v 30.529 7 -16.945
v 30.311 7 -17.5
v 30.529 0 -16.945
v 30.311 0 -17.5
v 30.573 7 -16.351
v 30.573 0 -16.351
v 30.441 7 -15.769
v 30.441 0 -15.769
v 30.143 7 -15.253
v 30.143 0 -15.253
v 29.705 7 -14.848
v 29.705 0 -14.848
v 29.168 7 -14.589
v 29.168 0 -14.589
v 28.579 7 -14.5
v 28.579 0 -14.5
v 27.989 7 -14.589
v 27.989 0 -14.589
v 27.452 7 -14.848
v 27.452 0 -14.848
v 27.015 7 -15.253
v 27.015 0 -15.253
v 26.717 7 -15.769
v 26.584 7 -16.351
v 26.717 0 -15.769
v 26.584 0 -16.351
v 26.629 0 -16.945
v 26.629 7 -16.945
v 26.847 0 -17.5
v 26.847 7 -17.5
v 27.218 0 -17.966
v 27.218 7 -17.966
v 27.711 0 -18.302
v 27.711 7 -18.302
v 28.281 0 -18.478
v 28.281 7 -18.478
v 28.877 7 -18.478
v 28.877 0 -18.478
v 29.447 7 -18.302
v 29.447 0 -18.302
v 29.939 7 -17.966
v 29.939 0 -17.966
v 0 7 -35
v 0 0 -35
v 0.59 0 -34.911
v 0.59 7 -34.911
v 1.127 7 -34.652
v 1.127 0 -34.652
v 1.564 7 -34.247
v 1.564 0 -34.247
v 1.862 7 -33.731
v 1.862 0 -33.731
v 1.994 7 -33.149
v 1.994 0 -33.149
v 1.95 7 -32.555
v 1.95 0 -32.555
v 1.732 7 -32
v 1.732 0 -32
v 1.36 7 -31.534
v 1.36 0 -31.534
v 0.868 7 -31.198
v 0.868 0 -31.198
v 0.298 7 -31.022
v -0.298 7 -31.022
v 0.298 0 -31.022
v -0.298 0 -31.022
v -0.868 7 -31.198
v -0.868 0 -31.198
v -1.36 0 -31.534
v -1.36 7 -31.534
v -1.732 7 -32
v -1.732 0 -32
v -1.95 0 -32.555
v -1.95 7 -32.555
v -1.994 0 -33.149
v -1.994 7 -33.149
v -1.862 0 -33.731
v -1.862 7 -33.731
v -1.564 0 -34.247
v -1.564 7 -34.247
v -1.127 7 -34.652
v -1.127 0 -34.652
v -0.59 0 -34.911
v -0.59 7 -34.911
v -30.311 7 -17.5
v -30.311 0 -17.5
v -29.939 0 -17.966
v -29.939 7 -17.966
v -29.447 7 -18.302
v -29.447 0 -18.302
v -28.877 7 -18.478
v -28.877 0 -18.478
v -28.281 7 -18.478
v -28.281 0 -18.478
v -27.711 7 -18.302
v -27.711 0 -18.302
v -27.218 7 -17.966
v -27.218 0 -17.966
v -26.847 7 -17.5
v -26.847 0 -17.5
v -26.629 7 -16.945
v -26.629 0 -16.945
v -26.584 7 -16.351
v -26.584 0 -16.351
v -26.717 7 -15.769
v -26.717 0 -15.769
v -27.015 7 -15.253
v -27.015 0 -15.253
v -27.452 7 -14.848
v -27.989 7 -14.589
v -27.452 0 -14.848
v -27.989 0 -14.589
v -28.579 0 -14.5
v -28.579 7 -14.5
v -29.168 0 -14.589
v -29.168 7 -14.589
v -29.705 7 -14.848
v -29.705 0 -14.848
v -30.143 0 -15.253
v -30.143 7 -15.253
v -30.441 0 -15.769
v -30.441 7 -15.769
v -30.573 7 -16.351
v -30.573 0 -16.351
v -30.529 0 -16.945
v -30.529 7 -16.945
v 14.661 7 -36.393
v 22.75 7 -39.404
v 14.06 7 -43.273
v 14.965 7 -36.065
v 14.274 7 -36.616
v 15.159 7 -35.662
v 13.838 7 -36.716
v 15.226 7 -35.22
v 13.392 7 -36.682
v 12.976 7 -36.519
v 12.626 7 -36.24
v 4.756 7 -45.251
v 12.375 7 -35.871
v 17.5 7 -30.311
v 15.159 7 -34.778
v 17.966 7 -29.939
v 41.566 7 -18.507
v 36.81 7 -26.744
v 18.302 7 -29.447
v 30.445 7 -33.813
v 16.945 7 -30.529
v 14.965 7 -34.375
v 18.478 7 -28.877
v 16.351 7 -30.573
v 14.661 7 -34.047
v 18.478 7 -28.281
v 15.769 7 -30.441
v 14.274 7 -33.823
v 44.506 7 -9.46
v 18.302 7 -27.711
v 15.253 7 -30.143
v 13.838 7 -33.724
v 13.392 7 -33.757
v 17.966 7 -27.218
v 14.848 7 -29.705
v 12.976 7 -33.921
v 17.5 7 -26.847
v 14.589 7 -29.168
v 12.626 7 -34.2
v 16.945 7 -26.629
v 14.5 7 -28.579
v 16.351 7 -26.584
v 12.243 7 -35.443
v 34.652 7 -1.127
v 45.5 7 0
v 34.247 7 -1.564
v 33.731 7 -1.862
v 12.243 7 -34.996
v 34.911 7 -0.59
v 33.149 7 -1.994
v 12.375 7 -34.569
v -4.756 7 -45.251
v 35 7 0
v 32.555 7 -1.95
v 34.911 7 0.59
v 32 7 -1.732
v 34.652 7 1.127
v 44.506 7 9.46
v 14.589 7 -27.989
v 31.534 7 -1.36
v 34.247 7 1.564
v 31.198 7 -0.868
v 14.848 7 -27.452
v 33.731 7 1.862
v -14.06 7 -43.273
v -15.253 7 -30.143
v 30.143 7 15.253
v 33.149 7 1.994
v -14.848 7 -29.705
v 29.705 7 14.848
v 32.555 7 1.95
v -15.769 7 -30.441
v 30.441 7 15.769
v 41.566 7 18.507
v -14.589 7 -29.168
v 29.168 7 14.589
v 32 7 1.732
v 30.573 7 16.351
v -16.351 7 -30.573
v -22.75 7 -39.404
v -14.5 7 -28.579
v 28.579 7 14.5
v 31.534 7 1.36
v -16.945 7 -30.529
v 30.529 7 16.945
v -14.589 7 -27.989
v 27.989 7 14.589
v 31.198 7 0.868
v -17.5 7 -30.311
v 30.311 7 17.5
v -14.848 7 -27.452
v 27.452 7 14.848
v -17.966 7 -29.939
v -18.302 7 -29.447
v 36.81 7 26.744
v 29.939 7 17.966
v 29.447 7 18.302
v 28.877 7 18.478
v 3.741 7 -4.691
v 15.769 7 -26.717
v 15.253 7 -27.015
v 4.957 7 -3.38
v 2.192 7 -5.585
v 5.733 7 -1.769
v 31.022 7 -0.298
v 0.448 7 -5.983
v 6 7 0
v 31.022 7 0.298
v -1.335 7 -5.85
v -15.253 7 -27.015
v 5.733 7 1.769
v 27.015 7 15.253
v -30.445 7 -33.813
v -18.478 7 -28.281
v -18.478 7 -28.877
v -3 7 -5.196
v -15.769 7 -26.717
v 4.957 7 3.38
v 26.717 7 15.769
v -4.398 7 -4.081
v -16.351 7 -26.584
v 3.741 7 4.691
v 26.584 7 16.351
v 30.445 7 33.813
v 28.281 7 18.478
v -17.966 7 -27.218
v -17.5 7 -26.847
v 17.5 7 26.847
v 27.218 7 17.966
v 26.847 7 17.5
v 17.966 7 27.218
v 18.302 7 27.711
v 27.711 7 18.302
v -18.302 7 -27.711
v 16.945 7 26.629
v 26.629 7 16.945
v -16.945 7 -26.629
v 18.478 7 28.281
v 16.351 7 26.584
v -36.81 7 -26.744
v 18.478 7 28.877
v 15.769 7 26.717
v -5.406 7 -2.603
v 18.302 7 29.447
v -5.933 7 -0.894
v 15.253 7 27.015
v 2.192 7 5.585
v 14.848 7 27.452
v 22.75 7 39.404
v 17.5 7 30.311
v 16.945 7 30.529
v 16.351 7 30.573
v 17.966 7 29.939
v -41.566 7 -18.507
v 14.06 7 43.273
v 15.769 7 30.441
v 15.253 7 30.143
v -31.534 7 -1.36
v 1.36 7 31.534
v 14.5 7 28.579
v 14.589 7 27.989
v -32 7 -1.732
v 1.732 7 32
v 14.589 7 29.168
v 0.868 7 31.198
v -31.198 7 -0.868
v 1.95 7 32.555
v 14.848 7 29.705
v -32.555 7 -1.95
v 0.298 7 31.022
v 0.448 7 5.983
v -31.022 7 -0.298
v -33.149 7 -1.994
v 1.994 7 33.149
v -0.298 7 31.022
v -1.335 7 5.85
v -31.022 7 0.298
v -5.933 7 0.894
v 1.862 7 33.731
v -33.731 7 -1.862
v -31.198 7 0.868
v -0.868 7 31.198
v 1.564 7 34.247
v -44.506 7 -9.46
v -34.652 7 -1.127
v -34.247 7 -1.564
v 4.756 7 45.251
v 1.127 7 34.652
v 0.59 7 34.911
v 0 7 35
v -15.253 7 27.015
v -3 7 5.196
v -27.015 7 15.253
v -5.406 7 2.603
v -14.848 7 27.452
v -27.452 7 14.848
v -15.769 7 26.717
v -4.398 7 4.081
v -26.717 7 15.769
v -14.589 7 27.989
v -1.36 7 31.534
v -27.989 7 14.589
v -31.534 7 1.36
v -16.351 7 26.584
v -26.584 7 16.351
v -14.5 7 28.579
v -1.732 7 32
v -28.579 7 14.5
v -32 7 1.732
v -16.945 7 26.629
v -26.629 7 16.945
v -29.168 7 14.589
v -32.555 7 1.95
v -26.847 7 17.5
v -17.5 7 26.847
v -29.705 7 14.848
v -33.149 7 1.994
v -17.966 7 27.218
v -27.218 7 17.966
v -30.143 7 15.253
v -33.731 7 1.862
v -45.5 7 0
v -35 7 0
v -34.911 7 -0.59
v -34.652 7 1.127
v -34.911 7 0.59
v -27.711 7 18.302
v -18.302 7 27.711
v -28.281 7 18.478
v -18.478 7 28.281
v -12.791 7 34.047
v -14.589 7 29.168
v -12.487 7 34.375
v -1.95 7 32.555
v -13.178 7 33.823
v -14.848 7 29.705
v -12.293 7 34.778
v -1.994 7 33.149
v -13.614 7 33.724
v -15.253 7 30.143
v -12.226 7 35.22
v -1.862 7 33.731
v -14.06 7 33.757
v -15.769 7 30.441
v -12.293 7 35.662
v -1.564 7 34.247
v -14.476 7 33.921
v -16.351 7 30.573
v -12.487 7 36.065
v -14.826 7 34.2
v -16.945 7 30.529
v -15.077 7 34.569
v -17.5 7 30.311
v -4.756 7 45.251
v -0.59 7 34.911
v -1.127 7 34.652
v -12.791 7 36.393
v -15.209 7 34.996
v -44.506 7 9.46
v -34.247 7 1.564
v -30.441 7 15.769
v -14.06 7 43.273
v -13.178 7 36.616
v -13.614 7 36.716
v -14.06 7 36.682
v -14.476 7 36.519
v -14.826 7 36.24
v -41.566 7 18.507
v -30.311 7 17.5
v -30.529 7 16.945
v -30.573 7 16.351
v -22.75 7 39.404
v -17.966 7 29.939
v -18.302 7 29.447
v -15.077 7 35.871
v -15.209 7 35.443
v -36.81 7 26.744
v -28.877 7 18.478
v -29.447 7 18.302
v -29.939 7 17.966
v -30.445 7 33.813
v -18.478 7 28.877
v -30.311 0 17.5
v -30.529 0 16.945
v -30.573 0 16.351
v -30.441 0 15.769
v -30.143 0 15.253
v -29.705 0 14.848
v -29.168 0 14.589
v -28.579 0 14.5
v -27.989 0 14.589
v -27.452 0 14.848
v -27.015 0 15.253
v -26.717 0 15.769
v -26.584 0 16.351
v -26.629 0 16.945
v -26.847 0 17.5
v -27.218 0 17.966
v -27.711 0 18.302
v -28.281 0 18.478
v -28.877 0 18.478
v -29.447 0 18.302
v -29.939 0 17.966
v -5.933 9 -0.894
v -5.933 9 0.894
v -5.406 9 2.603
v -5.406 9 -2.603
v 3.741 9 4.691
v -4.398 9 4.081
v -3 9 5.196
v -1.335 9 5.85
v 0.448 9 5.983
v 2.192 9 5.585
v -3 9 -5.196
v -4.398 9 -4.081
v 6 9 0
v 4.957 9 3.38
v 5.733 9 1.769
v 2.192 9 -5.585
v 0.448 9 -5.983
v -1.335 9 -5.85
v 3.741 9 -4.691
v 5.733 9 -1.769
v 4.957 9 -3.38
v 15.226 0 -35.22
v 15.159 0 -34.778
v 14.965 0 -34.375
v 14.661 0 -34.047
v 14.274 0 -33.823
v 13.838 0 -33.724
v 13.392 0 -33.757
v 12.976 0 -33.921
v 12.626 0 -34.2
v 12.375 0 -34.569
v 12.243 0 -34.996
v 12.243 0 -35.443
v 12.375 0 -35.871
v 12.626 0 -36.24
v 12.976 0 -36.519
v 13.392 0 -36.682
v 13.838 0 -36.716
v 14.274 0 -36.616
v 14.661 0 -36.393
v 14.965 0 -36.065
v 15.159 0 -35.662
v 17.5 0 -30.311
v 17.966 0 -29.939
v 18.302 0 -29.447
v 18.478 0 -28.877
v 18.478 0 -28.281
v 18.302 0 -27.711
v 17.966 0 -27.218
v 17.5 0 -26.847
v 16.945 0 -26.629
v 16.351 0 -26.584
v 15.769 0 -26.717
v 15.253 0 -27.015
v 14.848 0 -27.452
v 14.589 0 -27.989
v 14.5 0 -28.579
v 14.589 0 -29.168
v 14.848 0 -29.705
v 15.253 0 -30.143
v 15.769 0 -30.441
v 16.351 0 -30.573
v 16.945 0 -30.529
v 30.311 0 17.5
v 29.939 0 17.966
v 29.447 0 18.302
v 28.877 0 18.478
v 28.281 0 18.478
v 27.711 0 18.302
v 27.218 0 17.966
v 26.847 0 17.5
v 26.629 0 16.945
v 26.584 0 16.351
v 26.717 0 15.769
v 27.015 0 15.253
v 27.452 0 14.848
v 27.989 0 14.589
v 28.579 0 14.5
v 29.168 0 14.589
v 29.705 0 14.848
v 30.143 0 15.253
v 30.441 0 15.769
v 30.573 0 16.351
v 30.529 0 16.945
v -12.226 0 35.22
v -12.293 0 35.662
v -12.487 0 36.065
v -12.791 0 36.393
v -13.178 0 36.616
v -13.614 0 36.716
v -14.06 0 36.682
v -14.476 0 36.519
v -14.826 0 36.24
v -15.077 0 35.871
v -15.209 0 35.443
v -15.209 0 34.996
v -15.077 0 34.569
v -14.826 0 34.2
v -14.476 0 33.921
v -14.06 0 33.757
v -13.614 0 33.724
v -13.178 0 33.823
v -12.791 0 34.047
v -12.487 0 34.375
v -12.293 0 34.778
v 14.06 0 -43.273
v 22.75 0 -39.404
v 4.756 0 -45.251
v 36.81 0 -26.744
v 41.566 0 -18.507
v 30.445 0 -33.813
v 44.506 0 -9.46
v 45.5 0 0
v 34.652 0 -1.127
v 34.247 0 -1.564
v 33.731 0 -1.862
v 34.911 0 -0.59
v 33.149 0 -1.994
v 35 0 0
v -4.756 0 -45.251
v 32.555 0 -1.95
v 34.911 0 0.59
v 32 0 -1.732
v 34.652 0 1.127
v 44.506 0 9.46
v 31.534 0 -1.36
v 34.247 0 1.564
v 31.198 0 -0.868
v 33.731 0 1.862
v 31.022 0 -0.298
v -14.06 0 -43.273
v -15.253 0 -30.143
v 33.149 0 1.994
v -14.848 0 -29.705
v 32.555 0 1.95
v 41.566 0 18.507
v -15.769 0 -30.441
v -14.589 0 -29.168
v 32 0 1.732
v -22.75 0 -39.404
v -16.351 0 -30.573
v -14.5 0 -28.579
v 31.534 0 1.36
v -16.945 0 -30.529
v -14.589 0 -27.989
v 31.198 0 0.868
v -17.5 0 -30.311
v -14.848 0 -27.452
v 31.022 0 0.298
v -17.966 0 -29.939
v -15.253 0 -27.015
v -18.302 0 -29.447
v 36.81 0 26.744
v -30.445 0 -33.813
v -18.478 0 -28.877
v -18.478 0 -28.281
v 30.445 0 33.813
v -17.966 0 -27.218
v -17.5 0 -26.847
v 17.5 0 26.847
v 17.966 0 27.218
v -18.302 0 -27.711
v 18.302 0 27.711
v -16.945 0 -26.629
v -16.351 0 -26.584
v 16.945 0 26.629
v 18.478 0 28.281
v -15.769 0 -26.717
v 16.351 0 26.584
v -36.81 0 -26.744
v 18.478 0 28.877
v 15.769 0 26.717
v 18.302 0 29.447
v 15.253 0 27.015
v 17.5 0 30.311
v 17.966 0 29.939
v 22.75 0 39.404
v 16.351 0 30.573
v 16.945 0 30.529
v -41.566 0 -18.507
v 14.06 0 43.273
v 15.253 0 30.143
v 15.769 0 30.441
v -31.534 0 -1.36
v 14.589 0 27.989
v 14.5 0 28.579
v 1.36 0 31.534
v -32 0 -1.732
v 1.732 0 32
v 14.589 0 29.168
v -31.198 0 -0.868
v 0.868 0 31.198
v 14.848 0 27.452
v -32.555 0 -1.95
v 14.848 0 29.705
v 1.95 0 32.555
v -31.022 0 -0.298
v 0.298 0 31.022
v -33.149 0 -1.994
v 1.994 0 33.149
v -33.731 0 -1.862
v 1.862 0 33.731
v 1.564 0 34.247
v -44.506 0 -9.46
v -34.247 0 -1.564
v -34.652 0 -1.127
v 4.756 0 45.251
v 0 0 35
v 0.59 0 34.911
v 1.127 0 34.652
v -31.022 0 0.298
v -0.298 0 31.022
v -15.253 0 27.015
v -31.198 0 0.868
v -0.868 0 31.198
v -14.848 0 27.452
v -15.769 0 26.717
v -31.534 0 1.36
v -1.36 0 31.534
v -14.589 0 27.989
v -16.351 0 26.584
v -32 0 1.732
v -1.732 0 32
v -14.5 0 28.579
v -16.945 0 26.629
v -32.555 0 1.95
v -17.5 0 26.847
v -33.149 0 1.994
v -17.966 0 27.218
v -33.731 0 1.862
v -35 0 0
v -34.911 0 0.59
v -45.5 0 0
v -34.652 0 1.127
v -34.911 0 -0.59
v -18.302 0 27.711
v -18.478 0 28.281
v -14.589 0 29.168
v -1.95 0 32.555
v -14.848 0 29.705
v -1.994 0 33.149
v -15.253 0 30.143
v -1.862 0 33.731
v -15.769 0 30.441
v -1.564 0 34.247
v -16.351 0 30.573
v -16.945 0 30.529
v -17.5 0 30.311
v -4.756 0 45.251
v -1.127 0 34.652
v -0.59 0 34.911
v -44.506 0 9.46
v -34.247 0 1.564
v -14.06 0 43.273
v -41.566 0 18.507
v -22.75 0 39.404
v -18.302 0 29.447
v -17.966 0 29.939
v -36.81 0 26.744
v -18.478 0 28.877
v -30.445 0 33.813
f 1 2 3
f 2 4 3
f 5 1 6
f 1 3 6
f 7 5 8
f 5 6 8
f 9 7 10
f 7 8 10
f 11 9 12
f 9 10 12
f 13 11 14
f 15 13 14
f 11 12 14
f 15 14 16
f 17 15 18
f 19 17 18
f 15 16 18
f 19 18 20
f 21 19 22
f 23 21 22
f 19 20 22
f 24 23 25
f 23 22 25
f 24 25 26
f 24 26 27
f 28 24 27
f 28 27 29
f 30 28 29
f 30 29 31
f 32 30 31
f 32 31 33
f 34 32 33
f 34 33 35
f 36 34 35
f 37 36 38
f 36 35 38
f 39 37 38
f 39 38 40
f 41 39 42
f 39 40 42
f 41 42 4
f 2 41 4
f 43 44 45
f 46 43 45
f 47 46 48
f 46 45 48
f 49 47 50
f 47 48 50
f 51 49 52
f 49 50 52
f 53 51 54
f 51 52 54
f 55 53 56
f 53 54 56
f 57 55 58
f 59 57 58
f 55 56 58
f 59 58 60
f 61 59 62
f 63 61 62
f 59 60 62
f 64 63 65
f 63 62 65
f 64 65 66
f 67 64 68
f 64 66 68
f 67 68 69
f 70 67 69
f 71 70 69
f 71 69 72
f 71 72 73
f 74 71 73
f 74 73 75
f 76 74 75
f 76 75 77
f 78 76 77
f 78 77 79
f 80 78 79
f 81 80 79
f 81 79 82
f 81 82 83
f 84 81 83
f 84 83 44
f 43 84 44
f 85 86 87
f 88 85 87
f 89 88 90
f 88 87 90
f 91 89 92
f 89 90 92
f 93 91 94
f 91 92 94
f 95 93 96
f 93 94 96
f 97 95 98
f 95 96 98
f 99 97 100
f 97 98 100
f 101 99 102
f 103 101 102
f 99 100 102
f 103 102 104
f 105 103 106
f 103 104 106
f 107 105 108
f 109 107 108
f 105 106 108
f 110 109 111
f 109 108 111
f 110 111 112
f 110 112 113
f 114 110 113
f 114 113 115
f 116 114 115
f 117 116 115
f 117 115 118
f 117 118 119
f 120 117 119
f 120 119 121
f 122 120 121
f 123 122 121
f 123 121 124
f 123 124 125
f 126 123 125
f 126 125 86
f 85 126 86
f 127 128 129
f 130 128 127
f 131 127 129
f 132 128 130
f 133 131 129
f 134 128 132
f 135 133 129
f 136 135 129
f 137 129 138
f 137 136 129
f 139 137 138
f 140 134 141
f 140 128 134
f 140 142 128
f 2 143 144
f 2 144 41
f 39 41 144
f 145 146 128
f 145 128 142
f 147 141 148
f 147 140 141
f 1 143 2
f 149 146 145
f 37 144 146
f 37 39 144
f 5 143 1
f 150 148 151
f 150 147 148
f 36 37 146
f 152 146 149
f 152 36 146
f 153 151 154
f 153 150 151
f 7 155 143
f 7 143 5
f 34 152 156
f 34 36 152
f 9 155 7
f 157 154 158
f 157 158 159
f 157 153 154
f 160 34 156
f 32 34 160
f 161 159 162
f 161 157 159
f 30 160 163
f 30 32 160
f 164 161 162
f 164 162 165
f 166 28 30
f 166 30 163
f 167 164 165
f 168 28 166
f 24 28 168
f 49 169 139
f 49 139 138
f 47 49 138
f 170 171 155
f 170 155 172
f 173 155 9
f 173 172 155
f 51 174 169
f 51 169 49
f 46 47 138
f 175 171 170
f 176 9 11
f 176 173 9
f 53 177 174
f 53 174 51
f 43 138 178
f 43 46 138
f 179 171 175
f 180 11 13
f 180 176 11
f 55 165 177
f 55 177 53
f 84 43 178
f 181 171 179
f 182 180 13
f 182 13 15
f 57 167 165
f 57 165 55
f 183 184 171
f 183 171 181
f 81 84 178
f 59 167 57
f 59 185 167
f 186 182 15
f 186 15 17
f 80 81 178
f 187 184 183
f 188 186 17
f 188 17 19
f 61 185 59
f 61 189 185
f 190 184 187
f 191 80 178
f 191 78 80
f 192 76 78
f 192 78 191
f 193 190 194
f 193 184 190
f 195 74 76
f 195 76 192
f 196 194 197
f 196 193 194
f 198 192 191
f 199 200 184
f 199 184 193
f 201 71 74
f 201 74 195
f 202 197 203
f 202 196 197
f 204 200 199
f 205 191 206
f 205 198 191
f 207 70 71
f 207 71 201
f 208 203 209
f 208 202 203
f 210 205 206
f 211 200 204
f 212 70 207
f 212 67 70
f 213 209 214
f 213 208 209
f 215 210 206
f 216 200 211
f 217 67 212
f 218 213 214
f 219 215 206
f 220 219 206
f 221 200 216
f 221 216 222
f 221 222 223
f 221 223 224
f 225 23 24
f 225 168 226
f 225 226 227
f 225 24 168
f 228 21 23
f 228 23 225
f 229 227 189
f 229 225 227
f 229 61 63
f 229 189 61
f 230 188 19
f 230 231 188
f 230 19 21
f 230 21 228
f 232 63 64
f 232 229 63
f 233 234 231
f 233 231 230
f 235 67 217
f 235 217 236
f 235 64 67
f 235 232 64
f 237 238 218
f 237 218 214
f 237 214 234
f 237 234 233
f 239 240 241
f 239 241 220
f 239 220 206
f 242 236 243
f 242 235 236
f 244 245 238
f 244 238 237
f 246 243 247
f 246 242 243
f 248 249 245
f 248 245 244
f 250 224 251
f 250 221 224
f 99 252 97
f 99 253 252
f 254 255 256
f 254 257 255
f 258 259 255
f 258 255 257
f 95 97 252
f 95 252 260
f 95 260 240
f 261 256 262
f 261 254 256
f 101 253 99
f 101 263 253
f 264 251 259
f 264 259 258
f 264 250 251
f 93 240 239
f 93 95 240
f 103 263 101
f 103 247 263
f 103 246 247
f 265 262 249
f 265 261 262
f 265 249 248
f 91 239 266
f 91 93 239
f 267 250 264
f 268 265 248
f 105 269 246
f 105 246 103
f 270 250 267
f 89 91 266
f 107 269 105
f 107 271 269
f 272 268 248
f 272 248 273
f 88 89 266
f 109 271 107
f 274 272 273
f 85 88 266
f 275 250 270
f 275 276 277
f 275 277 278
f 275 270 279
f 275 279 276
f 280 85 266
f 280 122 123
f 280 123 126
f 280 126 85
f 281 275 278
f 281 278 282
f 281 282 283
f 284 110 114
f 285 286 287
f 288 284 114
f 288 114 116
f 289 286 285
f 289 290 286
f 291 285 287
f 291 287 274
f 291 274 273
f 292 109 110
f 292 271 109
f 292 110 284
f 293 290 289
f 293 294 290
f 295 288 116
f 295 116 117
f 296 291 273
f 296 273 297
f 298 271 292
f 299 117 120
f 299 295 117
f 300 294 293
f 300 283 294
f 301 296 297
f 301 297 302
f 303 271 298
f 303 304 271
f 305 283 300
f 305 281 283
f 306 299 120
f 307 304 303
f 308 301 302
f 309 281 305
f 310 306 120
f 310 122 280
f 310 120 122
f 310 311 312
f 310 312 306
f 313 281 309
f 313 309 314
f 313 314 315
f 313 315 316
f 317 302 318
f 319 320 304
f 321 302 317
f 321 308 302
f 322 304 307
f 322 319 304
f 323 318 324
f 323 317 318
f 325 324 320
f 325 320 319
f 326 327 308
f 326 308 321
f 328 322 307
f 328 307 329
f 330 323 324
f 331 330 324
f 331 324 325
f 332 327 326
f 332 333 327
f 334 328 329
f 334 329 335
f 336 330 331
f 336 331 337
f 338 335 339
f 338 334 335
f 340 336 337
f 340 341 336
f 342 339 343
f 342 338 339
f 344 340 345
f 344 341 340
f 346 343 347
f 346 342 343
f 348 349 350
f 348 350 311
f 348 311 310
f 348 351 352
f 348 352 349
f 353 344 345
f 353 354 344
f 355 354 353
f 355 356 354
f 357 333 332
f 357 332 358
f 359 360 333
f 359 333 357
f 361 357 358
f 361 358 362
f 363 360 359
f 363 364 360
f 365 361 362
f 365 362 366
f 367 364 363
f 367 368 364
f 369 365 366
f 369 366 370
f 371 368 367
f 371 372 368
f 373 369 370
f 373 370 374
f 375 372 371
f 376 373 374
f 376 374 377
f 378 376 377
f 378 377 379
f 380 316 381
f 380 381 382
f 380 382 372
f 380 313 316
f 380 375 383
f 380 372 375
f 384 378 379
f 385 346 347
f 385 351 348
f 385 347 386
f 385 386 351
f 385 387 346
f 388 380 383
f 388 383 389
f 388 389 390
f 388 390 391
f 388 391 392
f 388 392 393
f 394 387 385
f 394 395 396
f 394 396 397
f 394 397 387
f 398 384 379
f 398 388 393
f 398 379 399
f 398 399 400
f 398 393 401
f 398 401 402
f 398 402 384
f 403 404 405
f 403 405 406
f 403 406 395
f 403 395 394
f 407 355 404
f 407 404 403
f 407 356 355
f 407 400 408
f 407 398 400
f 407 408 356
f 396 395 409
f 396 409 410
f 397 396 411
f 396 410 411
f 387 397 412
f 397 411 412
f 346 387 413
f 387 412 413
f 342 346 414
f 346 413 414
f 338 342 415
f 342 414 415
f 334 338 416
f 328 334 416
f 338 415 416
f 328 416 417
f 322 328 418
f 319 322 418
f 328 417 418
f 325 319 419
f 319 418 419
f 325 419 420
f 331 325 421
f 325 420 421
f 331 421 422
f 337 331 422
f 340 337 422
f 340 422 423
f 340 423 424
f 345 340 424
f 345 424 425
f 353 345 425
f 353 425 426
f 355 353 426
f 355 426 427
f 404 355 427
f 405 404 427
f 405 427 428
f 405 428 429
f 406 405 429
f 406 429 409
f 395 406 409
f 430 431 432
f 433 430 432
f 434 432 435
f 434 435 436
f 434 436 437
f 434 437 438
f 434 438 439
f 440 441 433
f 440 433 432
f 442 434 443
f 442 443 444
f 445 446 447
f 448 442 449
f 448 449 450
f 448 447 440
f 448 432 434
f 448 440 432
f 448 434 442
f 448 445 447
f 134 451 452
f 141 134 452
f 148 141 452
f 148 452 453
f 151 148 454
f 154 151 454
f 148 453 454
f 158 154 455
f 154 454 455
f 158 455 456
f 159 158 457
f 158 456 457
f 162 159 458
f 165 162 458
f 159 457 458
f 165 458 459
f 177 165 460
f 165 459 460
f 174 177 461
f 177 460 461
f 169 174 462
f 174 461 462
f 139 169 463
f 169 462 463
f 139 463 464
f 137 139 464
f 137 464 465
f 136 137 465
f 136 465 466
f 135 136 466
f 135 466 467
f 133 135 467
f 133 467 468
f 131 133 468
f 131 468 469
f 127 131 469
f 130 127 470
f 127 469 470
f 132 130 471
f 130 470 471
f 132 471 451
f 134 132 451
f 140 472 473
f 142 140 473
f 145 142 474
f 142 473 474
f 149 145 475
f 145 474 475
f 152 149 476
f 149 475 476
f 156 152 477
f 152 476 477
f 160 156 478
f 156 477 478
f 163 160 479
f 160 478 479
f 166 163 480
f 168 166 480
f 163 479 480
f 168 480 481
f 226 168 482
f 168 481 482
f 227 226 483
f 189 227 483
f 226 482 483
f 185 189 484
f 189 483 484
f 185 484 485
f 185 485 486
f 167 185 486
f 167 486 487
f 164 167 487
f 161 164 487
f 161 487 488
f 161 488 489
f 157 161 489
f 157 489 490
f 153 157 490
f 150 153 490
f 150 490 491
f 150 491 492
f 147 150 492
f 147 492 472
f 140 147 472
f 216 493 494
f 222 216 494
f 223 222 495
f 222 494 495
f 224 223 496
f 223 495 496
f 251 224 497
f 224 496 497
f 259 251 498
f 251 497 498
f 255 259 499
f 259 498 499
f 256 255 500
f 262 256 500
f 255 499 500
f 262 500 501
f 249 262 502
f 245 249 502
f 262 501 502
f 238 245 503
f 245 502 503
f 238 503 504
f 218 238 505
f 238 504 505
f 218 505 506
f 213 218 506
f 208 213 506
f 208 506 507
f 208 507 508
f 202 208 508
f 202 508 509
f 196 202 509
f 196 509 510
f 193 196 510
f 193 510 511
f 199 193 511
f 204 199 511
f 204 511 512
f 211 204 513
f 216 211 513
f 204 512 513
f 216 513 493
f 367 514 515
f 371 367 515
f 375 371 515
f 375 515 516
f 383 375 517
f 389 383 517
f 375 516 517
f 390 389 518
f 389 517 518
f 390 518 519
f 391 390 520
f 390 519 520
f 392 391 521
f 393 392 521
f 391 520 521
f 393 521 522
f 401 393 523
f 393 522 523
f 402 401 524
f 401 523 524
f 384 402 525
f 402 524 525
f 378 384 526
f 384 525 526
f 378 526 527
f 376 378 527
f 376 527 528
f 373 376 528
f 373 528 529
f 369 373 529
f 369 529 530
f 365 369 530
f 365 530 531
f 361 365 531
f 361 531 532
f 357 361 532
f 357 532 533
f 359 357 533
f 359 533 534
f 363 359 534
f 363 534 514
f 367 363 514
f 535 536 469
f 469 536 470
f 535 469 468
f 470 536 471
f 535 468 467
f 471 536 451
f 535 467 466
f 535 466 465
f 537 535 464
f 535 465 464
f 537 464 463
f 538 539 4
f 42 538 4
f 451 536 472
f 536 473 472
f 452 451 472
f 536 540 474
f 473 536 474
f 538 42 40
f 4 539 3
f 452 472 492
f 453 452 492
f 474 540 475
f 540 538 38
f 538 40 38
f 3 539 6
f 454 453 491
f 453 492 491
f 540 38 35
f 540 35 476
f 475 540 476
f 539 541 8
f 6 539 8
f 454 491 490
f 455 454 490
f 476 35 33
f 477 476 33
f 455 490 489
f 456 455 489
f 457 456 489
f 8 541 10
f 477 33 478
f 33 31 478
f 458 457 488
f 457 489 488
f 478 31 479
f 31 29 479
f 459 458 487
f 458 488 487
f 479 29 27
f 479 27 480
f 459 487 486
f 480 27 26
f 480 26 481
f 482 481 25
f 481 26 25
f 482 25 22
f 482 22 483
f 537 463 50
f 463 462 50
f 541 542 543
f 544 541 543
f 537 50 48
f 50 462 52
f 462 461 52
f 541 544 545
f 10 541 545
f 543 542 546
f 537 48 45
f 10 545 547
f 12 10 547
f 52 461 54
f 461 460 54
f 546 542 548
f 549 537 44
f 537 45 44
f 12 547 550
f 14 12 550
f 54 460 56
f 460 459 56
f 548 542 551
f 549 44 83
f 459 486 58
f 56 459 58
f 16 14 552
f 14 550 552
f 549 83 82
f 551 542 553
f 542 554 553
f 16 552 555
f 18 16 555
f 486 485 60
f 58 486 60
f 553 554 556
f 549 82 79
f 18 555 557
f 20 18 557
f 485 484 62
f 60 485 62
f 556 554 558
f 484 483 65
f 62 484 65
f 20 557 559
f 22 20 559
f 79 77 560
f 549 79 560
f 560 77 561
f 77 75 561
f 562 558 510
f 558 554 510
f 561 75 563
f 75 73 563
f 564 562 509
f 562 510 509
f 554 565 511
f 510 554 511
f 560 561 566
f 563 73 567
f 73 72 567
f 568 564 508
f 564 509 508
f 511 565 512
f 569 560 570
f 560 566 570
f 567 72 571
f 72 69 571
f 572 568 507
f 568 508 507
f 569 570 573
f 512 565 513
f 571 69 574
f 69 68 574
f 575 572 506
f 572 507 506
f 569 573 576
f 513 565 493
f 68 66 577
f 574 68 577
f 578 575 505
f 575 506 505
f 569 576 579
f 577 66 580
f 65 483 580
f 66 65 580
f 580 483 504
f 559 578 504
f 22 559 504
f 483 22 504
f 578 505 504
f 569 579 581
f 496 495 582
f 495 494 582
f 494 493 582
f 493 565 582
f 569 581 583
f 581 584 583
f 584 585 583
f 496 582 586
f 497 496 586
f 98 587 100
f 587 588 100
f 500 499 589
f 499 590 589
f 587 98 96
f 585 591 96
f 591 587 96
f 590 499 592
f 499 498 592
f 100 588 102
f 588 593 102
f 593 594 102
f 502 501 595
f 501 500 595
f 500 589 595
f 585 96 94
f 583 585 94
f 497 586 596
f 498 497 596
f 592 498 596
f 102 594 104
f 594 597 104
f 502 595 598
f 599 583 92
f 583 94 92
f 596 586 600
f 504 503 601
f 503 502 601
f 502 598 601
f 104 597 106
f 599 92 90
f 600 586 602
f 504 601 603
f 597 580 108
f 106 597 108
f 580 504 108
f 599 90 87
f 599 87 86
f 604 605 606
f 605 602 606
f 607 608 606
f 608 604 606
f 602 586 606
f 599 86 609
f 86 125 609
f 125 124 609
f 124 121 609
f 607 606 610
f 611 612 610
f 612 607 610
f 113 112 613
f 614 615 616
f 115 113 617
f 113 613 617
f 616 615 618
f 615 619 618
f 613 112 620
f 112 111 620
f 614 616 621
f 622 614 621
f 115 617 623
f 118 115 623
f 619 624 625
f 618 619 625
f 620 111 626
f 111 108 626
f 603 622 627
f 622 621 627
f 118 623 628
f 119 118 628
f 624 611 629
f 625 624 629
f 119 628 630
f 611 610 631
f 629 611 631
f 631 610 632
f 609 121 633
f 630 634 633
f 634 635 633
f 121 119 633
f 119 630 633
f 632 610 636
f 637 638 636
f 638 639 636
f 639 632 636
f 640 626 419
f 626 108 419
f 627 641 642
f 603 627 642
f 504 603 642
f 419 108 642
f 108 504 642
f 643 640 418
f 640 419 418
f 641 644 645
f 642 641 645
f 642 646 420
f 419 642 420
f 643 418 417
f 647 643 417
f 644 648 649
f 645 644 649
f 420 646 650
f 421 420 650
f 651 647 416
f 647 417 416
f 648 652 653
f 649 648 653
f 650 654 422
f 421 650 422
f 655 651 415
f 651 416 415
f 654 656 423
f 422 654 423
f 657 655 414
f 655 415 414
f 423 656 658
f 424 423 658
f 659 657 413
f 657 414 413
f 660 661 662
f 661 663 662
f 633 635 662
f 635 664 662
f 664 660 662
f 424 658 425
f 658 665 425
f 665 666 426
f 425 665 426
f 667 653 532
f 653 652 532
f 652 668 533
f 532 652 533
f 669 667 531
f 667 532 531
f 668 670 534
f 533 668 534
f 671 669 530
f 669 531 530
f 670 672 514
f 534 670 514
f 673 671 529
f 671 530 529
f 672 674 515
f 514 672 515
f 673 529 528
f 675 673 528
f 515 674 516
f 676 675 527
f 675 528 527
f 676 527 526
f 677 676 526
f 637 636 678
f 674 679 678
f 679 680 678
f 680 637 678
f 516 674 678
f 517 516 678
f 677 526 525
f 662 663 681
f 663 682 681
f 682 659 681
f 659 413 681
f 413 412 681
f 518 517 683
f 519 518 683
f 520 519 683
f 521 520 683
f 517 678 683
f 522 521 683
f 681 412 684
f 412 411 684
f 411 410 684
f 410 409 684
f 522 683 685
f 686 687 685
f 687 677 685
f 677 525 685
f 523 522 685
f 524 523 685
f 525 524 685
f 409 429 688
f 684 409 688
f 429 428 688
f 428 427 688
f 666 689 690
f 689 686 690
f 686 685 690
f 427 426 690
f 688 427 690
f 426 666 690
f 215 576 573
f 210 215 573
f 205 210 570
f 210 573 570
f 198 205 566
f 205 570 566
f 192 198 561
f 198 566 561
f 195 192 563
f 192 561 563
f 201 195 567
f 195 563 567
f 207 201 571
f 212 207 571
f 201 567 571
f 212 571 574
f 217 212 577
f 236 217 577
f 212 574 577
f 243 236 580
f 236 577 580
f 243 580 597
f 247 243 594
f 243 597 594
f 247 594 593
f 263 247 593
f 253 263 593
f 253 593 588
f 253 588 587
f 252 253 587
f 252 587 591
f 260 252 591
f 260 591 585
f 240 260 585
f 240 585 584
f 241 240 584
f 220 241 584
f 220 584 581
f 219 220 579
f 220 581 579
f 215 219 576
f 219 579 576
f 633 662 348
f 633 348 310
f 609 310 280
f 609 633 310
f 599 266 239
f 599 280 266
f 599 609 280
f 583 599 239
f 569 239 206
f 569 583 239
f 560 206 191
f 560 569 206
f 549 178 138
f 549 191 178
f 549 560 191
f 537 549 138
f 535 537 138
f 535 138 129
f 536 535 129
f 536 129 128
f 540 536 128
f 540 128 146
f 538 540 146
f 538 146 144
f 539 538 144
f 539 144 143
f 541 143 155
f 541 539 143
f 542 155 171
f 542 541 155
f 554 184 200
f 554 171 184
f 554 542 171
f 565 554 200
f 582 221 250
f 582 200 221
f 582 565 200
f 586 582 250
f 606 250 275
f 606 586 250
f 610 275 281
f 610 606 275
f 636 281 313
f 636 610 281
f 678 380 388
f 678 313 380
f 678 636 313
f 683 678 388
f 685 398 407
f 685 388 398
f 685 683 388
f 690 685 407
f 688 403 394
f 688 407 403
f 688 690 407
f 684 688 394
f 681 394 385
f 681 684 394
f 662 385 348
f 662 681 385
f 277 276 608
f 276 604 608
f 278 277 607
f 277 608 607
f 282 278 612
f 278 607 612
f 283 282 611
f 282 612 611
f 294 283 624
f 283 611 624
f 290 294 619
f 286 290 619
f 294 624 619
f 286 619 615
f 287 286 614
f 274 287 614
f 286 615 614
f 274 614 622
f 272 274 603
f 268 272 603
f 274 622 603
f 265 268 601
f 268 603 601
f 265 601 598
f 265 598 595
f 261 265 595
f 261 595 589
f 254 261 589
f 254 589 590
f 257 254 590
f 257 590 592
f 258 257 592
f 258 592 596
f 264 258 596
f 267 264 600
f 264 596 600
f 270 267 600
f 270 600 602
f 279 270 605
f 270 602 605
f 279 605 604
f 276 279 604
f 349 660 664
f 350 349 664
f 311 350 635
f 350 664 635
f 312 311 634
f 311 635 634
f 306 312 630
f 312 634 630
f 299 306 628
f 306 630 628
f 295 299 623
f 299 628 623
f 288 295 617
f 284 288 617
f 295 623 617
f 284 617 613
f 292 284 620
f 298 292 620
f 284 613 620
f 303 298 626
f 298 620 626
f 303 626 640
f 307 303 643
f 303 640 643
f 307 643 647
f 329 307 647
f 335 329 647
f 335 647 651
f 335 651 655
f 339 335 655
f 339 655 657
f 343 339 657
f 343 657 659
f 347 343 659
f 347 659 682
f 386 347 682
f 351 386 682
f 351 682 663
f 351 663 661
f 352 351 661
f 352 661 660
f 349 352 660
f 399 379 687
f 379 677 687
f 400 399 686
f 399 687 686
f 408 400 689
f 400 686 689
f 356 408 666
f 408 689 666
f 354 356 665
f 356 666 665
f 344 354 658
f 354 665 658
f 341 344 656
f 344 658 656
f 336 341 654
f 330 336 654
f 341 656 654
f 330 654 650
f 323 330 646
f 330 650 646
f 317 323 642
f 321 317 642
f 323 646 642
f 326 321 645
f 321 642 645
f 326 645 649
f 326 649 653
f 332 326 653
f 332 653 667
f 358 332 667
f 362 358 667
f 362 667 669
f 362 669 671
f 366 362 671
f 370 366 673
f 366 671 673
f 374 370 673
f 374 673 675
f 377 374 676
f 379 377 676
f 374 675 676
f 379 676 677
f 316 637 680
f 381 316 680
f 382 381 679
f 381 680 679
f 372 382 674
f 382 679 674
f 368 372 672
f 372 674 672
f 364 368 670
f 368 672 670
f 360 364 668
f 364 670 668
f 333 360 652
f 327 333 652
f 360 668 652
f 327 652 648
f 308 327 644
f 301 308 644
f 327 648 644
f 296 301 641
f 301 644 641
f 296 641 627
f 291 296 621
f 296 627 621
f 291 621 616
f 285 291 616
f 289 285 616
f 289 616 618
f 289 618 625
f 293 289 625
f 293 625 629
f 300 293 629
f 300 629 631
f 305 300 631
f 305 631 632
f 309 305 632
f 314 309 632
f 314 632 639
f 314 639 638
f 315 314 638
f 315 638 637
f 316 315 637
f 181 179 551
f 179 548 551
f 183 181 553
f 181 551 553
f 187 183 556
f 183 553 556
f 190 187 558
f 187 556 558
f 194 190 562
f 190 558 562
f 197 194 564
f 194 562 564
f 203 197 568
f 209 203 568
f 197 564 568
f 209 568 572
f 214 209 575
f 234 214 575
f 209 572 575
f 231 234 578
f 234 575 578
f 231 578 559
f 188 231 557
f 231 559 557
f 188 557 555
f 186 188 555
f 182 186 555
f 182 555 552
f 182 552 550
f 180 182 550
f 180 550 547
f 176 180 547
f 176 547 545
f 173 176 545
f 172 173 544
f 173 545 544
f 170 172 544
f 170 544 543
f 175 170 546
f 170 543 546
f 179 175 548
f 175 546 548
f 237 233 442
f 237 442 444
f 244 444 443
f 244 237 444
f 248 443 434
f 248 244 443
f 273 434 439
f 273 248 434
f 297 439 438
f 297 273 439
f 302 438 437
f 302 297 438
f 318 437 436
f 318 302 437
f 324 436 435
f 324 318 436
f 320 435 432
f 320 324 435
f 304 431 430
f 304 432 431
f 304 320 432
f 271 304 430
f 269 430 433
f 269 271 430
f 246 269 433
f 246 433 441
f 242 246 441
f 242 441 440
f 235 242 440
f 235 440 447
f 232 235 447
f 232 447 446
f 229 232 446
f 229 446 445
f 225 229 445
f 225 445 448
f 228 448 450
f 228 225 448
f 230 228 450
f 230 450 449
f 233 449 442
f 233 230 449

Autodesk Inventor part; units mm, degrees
ref_plane "YZ Plane" through (0, 0, 0) normal (1, 0, 0) x (0, 1, 0)
ref_plane "XZ Plane" through (0, 0, 0) normal (0, 1, 0) x (-1, 0, 0)
ref_plane "XY Plane" through (0, 0, 0) normal (0, 0, 1) x (1, 0, 0)
sketch "Sketch1" plane through (0, 0, 0) normal (0, 1, 0) x (-1, 0, 0)
  circle A0 centre (0, 0) radius 45.5
  dimension "d0" = 91
extrude "Extrusion1" add sketch "Sketch1" along normal blind 7
sketch "Sketch5" plane through (0, 7, 0) normal (0, 1, 0) x (1, 0, 0)
  circle A0 centre (0, 0) radius 6
  dimension "d27" = 12
extrude "Extrusion5" add sketch "Sketch5" along normal blind 2
sketch "Sketch7" plane through (0, 0, 0) normal (0, -1, 0) x (1, 0, 0)
  circle A0 centre (0, 0) radius 45.5 projected
  line L0 (0, 0) -> (33, 0)
  circle A1 centre (33, 0) radius 2
  dimension "d37" = 4
  dimension "d38" = 33
extrude "Extrusion7" cut sketch "Sketch7" against normal blind 10 contours A1
pattern_circular "Circular Pattern1" count 12 over 360 about axis through (0, 0, 0) along (0, -1, 0) of "Extrusion7"
sketch "Sketch8" plane through (0, 0, 0) normal (0, -1, 0) x (1, 0, 0)
  circle A0 centre (-13.726, 35.2198) radius 1.5
  circle A1 centre (13.726, -35.2198) radius 1.5
  circle A2 centre (-16.5, 28.5788) radius 2 projected
  line L0 (-13.726, 35.2198) -> (13.726, -35.2198) construction
  point P0 (0, 0)
  point P1 (0, 0)
  dimension "d46" = 3
  dimension "d48" = 3
  dimension "d51" = 6.641
  dimension "d52" = 75.6
extrude "Extrusion8" cut sketch "Sketch8" against normal blind 10 contours A0 | A1
properties part number "bay container 12 bottom"
